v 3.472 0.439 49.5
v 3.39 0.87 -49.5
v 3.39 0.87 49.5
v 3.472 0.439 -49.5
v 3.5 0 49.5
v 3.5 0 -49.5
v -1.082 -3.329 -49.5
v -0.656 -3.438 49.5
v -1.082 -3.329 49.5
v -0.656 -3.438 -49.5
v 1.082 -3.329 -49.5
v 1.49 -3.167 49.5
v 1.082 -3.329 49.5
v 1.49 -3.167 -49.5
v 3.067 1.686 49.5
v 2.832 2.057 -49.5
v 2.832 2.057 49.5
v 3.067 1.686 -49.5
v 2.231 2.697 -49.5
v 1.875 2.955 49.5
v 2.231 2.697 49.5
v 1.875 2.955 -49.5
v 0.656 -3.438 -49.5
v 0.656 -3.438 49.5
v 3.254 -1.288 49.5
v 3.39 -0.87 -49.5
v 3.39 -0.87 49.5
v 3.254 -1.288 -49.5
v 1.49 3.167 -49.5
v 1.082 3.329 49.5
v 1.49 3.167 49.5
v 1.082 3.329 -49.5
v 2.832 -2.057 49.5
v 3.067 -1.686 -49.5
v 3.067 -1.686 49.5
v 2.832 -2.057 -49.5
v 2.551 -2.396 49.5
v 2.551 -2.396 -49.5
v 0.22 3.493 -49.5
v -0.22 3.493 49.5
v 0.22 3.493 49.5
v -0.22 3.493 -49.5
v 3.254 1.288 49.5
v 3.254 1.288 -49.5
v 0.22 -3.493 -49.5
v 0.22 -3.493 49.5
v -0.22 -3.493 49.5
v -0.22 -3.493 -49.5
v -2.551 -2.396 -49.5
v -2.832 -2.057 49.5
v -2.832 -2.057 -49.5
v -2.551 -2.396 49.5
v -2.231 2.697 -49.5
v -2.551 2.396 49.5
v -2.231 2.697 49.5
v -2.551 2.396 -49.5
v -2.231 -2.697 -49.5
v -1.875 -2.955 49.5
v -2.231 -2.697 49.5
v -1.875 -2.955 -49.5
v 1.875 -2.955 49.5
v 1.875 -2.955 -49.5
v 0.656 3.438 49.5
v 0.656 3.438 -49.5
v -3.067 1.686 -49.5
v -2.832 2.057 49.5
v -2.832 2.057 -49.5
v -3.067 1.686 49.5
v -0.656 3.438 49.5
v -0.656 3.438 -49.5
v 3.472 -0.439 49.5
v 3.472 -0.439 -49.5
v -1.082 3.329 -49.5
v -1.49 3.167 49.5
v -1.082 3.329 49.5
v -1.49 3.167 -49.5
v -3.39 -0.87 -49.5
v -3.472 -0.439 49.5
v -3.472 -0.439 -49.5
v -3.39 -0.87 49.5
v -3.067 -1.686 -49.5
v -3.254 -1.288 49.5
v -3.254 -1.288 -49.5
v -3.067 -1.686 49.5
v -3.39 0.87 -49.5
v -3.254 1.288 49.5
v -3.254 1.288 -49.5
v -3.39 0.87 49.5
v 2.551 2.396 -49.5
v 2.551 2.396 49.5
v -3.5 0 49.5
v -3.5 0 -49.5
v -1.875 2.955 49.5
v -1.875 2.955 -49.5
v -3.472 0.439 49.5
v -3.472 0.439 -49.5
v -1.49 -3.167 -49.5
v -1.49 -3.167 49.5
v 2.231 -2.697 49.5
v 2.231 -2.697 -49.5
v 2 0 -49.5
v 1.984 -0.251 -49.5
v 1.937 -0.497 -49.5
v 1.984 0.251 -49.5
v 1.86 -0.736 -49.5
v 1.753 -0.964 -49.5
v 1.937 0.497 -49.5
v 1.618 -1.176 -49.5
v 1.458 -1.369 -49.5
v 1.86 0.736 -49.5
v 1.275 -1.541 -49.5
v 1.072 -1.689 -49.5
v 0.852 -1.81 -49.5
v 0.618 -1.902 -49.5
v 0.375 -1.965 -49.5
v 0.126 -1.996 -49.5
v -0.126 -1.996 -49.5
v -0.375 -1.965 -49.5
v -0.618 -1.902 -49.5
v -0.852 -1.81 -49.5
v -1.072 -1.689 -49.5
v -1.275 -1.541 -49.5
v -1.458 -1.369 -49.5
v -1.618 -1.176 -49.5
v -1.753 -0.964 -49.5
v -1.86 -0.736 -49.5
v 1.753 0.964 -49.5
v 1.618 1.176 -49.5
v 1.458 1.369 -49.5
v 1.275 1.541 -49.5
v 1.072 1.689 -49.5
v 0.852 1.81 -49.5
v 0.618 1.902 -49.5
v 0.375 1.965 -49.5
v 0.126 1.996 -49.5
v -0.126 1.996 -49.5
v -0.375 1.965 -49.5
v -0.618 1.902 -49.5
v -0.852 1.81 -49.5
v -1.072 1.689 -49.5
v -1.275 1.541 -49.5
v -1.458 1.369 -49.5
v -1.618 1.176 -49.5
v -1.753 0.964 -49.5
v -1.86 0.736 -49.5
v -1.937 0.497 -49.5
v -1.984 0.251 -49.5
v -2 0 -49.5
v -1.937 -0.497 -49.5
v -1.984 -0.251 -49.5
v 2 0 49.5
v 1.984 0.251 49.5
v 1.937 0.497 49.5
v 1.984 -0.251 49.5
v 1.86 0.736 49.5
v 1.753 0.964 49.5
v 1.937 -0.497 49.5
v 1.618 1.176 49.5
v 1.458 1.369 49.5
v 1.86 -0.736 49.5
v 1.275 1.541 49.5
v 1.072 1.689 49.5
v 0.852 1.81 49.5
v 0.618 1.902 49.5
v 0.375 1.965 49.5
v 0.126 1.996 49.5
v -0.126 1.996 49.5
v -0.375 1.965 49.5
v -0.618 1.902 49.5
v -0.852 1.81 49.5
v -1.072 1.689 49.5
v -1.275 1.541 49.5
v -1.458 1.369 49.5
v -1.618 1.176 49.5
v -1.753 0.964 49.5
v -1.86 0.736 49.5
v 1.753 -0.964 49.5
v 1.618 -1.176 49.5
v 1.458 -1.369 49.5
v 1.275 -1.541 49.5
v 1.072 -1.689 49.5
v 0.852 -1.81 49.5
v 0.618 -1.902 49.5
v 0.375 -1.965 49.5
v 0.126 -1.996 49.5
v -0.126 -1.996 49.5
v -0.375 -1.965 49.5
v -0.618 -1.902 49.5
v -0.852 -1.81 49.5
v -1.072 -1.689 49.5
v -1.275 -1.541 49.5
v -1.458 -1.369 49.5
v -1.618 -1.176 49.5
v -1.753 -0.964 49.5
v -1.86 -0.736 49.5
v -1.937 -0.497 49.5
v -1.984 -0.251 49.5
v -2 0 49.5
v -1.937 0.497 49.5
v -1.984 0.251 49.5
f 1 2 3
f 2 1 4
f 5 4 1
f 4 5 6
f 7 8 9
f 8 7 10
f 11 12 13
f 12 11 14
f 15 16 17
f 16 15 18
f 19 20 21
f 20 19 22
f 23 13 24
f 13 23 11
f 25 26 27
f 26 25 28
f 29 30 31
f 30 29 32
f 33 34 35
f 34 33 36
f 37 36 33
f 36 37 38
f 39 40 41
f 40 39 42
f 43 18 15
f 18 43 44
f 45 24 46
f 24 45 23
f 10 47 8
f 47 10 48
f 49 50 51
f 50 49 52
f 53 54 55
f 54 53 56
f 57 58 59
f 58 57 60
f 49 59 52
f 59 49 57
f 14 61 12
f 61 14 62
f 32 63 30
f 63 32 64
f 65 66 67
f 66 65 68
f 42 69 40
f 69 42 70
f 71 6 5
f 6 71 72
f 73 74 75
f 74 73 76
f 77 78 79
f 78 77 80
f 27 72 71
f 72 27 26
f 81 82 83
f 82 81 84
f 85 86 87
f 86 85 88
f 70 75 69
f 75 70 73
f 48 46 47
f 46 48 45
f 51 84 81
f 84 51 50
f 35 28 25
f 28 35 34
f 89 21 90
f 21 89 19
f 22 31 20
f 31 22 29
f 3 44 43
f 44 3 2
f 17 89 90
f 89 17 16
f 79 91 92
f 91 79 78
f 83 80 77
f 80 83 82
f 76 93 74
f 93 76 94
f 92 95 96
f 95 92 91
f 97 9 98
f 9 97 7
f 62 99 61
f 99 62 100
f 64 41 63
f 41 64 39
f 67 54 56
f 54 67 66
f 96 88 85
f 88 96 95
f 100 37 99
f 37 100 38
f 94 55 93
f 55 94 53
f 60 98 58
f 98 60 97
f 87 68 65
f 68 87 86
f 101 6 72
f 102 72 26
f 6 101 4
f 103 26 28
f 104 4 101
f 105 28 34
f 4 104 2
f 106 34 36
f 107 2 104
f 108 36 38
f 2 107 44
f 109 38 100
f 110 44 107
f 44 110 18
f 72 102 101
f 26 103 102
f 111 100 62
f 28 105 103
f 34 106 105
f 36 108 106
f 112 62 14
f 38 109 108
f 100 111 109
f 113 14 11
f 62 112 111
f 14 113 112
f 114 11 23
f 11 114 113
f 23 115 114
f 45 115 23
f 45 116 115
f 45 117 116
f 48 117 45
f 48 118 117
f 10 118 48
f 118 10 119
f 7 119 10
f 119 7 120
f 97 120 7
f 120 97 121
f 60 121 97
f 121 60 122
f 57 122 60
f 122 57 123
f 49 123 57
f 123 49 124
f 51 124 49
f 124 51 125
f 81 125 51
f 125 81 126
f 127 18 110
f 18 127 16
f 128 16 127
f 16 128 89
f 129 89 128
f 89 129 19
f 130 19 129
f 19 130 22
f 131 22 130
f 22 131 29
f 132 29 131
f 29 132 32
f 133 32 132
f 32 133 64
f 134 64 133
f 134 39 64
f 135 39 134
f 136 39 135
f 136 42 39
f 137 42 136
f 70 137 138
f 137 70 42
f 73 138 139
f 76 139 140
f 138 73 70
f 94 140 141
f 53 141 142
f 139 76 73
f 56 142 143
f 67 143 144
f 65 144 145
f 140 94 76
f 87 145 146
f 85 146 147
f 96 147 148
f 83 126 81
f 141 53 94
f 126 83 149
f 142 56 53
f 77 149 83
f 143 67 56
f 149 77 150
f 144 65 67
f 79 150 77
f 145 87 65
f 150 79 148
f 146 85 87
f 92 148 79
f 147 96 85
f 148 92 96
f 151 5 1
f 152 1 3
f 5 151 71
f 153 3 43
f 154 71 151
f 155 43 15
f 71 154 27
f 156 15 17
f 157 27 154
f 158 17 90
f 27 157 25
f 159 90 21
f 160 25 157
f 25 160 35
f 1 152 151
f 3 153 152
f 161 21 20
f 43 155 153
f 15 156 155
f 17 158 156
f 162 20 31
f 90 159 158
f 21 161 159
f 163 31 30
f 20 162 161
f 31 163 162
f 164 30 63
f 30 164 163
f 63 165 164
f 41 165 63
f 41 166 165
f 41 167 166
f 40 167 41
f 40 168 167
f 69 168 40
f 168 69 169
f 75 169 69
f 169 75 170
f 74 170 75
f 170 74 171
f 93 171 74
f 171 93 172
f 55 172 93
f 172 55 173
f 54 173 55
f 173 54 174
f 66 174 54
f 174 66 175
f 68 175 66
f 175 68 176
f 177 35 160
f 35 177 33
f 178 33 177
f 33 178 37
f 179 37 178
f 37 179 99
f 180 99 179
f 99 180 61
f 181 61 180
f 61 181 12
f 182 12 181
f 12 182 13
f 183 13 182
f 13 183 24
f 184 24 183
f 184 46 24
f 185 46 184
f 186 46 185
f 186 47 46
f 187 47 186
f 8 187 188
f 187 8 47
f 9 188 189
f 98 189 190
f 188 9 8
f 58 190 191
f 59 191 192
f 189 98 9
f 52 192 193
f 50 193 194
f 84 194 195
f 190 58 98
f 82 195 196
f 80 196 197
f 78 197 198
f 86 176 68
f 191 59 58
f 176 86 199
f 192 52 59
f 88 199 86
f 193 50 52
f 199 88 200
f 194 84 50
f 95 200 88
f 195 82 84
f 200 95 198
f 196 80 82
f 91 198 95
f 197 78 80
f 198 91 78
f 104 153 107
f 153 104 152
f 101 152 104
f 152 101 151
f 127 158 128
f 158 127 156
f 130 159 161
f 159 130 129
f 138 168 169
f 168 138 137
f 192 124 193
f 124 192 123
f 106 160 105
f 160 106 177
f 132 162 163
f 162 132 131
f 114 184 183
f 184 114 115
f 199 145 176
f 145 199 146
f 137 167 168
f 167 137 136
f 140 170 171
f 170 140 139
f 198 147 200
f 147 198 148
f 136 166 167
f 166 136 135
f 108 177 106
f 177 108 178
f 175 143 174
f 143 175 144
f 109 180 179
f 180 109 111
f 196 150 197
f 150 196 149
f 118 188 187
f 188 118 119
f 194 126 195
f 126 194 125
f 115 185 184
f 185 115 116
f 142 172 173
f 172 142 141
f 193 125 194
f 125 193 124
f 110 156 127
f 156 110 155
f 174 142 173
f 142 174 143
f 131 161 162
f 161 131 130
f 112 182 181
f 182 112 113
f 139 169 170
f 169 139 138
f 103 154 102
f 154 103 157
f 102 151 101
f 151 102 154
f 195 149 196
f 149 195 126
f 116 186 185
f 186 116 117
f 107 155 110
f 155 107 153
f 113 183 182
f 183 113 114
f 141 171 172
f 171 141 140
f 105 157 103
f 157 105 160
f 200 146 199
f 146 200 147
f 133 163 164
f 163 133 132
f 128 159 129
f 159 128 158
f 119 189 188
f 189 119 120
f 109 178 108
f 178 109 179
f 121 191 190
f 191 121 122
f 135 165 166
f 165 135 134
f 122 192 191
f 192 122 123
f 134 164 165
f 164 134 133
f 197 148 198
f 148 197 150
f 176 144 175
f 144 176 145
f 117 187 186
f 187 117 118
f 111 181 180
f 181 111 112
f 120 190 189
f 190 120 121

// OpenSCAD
$fn = 50;


difference() {
	union() {
		translate(v = [0, 0, -49.5000000000]) {
			cylinder(h = 99, r = 3.5000000000);
		}
	}
	union() {
		translate(v = [0, 0, -100.0000000000]) {
			cylinder(h = 200, r = 2.0000000000);
		}
	}
}
